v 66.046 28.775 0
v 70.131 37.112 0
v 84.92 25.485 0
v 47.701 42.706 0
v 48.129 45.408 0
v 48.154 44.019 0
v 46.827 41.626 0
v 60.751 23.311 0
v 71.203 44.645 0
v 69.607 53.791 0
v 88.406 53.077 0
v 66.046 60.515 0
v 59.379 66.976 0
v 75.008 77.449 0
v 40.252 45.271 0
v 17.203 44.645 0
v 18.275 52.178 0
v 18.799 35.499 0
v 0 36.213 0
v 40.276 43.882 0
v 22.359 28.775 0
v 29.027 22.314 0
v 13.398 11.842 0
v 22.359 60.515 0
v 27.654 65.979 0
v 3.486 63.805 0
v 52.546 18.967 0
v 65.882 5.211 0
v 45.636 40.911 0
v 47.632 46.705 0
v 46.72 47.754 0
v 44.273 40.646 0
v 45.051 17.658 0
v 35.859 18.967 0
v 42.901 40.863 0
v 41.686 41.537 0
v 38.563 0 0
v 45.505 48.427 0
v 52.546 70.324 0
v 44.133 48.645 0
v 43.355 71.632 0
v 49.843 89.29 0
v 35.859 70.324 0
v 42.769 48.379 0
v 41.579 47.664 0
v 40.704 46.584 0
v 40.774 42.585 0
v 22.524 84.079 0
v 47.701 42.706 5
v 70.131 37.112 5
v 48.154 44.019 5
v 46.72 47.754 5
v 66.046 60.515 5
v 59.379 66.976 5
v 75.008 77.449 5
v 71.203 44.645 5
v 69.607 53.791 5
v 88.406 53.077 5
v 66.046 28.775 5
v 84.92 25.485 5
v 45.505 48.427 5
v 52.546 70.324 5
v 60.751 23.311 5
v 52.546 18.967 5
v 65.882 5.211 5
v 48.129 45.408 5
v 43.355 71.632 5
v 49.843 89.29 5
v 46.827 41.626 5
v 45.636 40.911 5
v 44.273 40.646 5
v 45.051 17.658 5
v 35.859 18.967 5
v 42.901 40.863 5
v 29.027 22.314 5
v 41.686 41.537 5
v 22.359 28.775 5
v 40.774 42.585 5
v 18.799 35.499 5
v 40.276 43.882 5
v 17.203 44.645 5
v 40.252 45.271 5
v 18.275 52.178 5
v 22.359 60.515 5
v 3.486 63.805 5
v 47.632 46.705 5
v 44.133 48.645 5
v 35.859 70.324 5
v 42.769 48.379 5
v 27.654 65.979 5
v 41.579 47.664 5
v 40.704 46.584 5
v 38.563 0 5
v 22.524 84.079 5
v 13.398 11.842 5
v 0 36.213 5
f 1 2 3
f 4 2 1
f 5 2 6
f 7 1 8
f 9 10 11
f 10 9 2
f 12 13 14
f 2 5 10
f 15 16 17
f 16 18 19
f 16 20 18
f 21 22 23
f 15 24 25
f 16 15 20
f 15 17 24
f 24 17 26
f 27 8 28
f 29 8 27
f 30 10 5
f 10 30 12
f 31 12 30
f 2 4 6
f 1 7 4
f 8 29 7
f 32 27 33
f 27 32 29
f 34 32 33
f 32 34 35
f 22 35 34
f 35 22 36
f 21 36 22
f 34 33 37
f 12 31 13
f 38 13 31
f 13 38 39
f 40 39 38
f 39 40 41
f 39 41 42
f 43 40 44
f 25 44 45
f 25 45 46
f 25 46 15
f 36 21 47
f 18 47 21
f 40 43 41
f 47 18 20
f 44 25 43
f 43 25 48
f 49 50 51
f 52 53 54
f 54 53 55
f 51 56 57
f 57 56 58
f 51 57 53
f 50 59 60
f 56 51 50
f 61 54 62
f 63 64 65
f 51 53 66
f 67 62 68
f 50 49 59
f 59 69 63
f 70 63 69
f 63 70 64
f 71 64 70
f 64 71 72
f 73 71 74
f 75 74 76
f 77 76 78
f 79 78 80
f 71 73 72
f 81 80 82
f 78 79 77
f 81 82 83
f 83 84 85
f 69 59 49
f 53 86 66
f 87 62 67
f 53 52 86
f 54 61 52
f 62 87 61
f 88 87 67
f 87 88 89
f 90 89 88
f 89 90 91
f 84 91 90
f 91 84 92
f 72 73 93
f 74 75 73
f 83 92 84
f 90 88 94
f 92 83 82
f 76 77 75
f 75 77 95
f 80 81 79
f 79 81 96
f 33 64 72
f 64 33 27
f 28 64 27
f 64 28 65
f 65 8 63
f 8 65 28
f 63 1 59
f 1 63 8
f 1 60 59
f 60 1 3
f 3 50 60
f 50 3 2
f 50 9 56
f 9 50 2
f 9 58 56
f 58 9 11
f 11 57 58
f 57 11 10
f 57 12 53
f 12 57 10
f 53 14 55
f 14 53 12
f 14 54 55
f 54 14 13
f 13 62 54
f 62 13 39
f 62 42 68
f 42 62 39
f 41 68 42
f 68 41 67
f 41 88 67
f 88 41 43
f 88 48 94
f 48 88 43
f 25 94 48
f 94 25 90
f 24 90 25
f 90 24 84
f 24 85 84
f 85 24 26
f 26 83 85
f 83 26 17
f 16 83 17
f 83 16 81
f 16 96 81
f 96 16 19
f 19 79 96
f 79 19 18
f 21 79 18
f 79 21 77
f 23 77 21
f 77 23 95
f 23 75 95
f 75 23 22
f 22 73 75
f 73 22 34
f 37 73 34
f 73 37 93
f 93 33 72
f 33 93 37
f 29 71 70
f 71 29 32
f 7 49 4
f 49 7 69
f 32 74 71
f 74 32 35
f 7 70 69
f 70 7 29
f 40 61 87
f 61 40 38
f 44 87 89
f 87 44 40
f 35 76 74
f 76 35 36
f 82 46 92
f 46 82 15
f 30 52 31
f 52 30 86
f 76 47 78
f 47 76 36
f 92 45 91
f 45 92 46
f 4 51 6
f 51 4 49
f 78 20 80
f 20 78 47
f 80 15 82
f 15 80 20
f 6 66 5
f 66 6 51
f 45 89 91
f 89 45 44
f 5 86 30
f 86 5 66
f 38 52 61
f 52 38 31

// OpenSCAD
$fn = 32;

// ----------------------------------------------------------------------
// Star wheel: 10-point ratchet, R45
// ----------------------------------------------------------------------

// --- parameters (mm) ---
n_points = 10;            // number of points / teeth
r_out = 45;               // tip radius
r_in = 27;                // root radius
bore_r = 4;               // centre bore radius
plate_t = 5;              // plate thickness, Z (extrusion height)
bore_d = 8;               // centre bore diameter

profile = [[17.203, 44.645], [0, 36.213], [18.799, 35.499], [22.359, 28.775], [13.398, 11.842], [29.027, 22.314], [35.859, 18.967], [38.563, 0], [45.051, 17.658], [52.546, 18.967], [65.882, 5.211], [60.751, 23.311], [66.046, 28.775], [84.92, 25.485], [70.131, 37.112], [71.203, 44.645], [88.406, 53.077], [69.607, 53.791], [66.046, 60.515], [75.008, 77.449], [59.379, 66.976], [52.546, 70.324], [49.843, 89.29], [43.355, 71.632], [35.859, 70.324], [22.524, 84.079], [27.654, 65.979], [22.359, 60.515], [3.486, 63.805], [18.275, 52.178]];  // primary outline, 30 points, counter clockwise
void_1 = [[48.129, 45.408], [47.632, 46.705], [46.72, 47.754], [45.505, 48.427], [44.133, 48.645], [42.769, 48.379], [41.579, 47.664], [40.704, 46.584], [40.252, 45.271], [40.276, 43.882], [40.774, 42.585], [41.686, 41.537], [42.901, 40.863], [44.273, 40.646], [45.636, 40.911], [46.827, 41.626], [47.701, 42.706], [48.154, 44.019]];  // centre bore, 18 points

// --- the one profile operation ---
difference() {
  linear_extrude(height = plate_t) polygon(points = profile);
  translate([0, 0, -1])
    linear_extrude(height = plate_t + 2) polygon(points = void_1);
}
